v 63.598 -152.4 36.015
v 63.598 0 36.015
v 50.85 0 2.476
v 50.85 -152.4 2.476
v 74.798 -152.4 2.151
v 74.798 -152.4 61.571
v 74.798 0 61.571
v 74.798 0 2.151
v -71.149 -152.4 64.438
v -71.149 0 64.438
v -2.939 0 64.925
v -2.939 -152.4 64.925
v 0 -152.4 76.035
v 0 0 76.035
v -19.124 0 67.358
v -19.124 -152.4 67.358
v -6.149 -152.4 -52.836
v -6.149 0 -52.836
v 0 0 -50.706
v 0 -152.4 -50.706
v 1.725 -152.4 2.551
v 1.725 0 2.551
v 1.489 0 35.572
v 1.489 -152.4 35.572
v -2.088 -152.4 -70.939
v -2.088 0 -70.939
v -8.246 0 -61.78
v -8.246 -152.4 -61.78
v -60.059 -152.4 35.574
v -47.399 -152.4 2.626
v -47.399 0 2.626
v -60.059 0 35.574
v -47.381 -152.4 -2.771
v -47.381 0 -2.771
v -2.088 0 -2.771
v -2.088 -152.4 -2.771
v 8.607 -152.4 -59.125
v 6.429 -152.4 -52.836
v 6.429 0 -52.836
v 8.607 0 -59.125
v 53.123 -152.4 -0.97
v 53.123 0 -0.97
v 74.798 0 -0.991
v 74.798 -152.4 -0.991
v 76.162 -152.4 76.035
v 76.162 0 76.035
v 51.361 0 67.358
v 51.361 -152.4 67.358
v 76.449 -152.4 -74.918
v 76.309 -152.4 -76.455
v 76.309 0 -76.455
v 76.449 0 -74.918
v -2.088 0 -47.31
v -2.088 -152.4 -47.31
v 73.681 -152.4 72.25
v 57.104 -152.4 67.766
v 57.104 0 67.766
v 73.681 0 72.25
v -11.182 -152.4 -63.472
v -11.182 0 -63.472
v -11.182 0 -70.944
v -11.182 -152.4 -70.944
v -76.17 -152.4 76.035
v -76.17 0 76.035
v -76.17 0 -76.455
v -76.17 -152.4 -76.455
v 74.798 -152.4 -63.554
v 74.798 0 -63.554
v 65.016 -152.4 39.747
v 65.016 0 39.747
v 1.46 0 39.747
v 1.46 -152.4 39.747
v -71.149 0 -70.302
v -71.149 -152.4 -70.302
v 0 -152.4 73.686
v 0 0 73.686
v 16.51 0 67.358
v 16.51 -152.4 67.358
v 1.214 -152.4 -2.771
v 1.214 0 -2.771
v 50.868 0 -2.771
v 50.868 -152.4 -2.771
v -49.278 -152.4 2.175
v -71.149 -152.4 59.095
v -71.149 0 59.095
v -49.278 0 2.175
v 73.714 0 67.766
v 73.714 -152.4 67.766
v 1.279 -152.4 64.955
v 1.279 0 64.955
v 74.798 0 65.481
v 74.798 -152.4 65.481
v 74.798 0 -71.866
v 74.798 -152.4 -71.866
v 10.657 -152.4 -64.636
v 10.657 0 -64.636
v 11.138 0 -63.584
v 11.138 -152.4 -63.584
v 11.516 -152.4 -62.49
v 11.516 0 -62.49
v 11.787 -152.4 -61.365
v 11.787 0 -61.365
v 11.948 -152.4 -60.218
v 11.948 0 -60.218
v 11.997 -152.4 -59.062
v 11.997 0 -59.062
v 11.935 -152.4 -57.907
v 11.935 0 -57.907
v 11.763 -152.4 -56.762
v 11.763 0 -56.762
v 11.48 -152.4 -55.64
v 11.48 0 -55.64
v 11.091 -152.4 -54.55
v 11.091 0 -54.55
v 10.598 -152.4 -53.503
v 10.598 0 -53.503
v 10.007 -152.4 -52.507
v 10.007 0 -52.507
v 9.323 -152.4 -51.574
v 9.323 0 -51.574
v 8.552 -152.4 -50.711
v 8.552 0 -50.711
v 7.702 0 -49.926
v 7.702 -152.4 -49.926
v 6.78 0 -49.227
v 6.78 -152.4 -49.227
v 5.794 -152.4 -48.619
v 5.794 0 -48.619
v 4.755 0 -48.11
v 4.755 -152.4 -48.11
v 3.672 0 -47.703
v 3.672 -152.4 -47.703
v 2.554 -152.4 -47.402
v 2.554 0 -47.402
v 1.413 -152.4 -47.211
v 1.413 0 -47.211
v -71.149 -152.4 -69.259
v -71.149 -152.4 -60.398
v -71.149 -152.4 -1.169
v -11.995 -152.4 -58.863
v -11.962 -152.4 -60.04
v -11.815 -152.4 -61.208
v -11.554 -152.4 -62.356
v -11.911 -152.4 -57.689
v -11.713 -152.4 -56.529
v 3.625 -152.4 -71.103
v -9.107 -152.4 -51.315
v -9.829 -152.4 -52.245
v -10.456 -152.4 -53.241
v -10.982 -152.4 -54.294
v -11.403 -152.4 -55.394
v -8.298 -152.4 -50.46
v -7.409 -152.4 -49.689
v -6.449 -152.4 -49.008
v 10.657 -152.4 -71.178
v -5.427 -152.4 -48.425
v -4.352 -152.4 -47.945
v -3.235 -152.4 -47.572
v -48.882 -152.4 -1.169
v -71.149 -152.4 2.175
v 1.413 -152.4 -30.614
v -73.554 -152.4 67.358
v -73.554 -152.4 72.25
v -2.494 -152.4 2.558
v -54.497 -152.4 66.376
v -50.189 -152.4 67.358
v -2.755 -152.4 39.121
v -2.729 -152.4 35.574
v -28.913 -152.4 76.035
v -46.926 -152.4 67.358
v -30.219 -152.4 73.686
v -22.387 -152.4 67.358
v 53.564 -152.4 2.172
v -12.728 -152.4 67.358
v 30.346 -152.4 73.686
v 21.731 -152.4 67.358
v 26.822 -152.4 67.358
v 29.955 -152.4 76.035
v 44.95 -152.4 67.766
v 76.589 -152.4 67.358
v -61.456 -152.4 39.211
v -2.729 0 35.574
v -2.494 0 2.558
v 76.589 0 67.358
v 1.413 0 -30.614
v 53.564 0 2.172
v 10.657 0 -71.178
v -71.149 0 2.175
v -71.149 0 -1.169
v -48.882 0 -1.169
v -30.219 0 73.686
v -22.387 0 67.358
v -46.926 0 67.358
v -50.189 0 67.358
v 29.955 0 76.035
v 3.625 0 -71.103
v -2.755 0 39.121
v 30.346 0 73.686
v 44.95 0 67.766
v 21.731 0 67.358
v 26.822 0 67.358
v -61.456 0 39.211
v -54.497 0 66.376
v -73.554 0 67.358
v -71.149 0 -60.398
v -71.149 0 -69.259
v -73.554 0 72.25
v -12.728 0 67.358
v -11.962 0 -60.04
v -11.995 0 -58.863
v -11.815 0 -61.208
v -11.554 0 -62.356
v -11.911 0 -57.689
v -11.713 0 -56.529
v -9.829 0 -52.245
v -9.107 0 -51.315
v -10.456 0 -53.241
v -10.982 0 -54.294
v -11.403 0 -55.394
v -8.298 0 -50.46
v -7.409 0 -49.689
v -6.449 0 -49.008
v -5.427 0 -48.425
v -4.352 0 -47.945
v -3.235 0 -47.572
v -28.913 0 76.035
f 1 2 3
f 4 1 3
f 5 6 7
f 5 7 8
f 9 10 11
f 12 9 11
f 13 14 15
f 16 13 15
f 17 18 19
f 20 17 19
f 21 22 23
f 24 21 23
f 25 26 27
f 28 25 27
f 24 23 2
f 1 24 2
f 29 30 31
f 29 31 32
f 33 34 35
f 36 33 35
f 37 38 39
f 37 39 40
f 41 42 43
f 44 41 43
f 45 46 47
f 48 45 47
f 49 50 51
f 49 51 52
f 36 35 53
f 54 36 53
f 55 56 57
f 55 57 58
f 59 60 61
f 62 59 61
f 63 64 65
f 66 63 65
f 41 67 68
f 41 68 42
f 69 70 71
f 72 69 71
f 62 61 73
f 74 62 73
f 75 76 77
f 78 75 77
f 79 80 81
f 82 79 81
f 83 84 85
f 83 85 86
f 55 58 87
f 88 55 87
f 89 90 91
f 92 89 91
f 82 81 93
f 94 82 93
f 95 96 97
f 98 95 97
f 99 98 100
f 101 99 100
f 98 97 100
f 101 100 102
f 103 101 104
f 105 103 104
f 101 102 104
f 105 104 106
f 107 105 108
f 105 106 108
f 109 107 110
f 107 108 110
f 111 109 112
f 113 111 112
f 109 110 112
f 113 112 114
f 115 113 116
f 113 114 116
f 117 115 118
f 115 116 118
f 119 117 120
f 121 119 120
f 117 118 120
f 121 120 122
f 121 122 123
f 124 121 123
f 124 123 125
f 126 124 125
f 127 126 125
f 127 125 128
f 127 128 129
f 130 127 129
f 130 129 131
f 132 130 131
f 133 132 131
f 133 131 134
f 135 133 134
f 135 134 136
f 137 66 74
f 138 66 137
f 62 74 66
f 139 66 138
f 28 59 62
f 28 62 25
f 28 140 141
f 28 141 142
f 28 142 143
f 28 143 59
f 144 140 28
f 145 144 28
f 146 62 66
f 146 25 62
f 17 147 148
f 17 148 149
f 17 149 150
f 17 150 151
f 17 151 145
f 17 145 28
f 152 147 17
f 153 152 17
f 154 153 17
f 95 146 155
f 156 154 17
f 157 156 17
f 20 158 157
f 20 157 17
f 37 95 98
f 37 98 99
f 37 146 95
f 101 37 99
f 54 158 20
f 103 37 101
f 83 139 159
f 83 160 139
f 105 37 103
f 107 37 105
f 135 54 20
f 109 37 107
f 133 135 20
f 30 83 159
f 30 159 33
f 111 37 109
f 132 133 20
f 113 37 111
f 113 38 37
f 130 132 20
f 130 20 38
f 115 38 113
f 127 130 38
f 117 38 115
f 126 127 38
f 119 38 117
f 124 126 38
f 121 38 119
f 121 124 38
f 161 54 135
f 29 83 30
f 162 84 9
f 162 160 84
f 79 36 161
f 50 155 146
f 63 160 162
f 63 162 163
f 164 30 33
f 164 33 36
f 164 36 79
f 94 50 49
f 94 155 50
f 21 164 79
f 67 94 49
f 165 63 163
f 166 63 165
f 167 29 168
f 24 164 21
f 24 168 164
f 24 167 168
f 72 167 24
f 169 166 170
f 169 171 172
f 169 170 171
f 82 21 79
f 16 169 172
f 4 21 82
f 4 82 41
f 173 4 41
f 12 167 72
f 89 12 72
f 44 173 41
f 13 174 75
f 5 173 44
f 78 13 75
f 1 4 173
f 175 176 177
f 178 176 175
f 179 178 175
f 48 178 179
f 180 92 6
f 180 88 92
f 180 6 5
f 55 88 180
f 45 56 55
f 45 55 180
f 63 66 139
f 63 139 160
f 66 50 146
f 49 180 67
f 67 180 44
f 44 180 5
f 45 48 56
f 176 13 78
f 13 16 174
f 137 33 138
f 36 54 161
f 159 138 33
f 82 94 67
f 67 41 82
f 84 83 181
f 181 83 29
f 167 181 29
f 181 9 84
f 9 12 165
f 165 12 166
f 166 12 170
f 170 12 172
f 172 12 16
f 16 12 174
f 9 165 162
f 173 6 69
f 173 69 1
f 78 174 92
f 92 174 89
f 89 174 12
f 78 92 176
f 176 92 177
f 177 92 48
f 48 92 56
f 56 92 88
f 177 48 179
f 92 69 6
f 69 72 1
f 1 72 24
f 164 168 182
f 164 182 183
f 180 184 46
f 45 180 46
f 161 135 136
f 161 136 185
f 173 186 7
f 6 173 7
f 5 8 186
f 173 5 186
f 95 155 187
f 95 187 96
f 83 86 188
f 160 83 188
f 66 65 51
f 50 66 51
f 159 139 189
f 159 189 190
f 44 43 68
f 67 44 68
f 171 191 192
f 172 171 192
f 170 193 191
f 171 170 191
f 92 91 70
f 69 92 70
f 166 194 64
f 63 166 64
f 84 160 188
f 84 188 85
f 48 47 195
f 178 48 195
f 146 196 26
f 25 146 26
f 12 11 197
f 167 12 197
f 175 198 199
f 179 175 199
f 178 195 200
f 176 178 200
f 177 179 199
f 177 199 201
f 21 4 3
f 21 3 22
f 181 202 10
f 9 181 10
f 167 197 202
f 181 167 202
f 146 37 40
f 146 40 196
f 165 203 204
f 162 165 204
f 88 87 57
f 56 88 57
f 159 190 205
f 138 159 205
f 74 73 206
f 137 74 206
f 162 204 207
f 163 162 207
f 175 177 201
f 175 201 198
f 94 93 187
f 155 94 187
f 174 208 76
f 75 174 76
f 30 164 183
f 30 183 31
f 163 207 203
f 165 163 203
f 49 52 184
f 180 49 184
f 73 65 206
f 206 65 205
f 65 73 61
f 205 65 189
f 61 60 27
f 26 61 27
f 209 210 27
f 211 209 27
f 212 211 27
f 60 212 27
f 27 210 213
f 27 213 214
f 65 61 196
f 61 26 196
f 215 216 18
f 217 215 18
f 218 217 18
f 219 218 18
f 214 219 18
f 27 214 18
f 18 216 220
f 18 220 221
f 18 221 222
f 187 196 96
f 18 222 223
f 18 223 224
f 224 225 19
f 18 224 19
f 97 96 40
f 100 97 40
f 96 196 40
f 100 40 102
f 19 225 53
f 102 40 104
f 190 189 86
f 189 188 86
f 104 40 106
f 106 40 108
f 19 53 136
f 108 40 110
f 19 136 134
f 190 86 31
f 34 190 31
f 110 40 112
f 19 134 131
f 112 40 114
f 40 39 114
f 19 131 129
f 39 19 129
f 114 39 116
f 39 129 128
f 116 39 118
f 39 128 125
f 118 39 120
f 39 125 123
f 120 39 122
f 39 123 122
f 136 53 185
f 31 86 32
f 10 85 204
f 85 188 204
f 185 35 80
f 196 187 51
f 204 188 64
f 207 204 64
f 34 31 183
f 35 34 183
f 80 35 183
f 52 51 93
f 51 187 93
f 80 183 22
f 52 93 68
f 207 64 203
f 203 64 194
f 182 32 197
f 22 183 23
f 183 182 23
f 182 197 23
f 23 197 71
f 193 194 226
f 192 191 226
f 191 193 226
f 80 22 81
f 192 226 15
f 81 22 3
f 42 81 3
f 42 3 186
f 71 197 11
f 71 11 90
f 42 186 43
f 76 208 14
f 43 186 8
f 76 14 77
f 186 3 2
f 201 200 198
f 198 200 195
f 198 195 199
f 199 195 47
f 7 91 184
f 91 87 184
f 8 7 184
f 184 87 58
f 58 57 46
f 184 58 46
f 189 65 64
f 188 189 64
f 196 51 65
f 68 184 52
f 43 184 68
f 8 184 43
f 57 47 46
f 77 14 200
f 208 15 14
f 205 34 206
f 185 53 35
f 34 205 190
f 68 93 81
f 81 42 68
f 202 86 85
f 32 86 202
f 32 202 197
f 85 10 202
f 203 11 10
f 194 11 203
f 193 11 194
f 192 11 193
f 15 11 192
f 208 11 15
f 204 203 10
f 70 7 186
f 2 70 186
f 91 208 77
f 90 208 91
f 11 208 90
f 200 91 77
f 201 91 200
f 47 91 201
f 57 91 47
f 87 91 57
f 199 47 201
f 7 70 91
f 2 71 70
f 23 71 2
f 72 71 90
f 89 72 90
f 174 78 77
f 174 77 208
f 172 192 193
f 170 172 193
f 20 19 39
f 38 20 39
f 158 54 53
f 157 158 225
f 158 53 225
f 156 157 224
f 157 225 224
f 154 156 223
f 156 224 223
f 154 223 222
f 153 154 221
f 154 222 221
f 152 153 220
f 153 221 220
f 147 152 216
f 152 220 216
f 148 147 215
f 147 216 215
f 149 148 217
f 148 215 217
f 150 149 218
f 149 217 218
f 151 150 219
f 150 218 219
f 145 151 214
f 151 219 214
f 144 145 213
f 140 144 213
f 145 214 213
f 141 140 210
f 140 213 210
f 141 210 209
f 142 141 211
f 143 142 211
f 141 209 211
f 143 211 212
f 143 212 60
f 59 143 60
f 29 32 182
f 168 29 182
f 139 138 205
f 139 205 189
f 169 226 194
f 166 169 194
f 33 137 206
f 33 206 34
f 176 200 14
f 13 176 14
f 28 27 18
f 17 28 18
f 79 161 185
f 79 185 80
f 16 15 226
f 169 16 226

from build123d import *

# Parameters (mm, degrees)
F1_DEPTH = 152.4


with BuildPart() as f1:
    # F0 (on Front) → F1 (new body)
    with BuildSketch(Plane.XZ):
        Polygon((-76.169543, 76.035284), (-76.169543, 67.358479), (-76.169543, -76.455206), (76.309301, -76.455206), (76.449059, -74.917838), (76.588824, 67.358479), (76.161504, 76.035284), (51.361255, 67.358479), (29.954717, 76.035284), (21.731475, 67.358479), (0, 76.035284), (-19.123683, 67.358479), (-28.913258, 76.035284), (-50.189264, 67.358479), align=None)
        Polygon((3.625234, -71.103098), (-2.087809, -70.939283), (-8.245876, -61.780341), (-6.149467, -52.835658), (0, -50.705924), (6.428989, -52.835658), (8.607126, -59.124887), align=None, mode=Mode.SUBTRACT)
        Polygon((-71.148954, -1.168579), (-48.882278, -1.168579), (-71.148954, -60.398426), align=None, mode=Mode.SUBTRACT)
        with BuildLine():
            Line((-11.182051, -70.944449), (-71.148954, -70.30195))
            Line((-71.148954, -70.30195), (-71.148954, -69.259472))
            Line((-71.148954, -69.259472), (-47.38087, -2.771367))
            Line((-47.38087, -2.771367), (-2.087809, -2.771367))
            Line((-2.087809, -2.771367), (-2.087809, -30.61372))
            Line((-2.087809, -30.61372), (-2.087809, -47.310491))
            ThreePointArc((-2.087809, -47.310491), (-10.455808, -53.241436), (-11.182051, -63.472373))
            Line((-11.182051, -63.472373), (-11.182051, -70.944449))
        make_face(mode=Mode.SUBTRACT)
        with BuildLine():
            Line((1.213909, -2.771367), (50.868321, -2.771367))
            Line((50.868321, -2.771367), (74.797623, -71.865655))
            Line((74.797623, -71.865655), (10.656672, -71.178434))
            Line((10.656672, -71.178434), (10.656672, -64.63617))
            ThreePointArc((10.656672, -64.63617), (10.598486, -53.50252), (1.412784, -47.210906))
            Line((1.412784, -47.210906), (1.412784, -30.61372))
            Line((1.412784, -30.61372), (1.213909, -2.771367))
        make_face(mode=Mode.SUBTRACT)
        Polygon((74.797623, -63.553585), (53.123125, -0.969895), (74.797623, -0.991187), align=None, mode=Mode.SUBTRACT)
        Polygon((-71.148954, 2.174516), (-71.148954, 59.095334), (-49.278473, 2.174516), align=None, mode=Mode.SUBTRACT)
        Polygon((-2.493593, 2.557827), (-47.399332, 2.626492), (-60.058687, 35.574137), (-2.729424, 35.574137), align=None, mode=Mode.SUBTRACT)
        Polygon((-54.496676, 66.376239), (-73.553719, 67.358479), (-73.553719, 72.249986), align=None, mode=Mode.SUBTRACT)
        Polygon((-61.455923, 39.210627), (-71.148954, 64.438023), (-2.939075, 64.925237), (-2.754758, 39.120867), align=None, mode=Mode.SUBTRACT)
        Polygon((-22.386873, 67.358479), (-46.926074, 67.358479), (-30.218534, 73.685788), align=None, mode=Mode.SUBTRACT)
        Polygon((50.849744, 2.47626), (1.725206, 2.551376), (1.489346, 35.571639), (63.597905, 36.015273), align=None, mode=Mode.SUBTRACT)
        Polygon((53.563669, 2.172005), (74.797623, 61.571211), (74.797623, 2.151146), align=None, mode=Mode.SUBTRACT)
        Polygon((1.279462, 64.95537), (74.797623, 65.4805), (65.016477, 39.747379), (1.459519, 39.747379), align=None, mode=Mode.SUBTRACT)
        Polygon((16.510369, 67.358479), (-12.727827, 67.358479), (0, 73.685788), align=None, mode=Mode.SUBTRACT)
        Polygon((44.950325, 67.766275), (26.822057, 67.358479), (30.346299, 73.685788), align=None, mode=Mode.SUBTRACT)
        Polygon((73.713515, 67.766275), (57.104468, 67.766275), (73.681489, 72.249986), align=None, mode=Mode.SUBTRACT)
    extrude(amount=F1_DEPTH)


solid = f1.part
